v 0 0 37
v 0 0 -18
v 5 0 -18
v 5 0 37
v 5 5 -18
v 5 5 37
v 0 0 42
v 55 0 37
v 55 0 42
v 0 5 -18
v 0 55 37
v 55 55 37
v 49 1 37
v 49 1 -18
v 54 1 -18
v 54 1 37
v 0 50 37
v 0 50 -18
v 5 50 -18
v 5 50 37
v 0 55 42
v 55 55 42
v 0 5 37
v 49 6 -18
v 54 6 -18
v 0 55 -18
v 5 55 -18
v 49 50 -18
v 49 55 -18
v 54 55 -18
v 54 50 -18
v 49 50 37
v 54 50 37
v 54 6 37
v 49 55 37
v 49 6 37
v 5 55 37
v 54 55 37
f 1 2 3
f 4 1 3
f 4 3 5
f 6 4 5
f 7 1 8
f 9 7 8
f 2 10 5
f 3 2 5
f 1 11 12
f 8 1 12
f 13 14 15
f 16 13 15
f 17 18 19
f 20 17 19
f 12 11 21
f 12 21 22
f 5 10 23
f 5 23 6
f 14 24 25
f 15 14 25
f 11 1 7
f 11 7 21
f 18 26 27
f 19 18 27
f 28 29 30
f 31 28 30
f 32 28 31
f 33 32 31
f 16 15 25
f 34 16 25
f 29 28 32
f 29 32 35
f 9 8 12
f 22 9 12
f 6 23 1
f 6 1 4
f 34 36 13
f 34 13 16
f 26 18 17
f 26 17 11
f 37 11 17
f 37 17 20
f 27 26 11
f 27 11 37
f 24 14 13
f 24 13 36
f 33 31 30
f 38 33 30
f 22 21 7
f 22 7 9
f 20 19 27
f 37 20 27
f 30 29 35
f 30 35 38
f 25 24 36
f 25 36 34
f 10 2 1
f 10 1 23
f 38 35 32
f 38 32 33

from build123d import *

# Parameters (mm, degrees)
BOX001_W     = 55
BOX001_H     = 55
BOX001_DEPTH = 5
BOX002_W     = 5
BOX002_H     = 5
BOX002_DEPTH = 55
BOX003_W     = 5
BOX003_H     = 5
BOX003_DEPTH = 55
BOX004_W     = 5
BOX004_H     = 5
BOX004_DEPTH = 55
BOX005_W     = 5
BOX005_H     = 5
BOX005_DEPTH = 55


with BuildPart() as caja001:
    # Box001 → Box001 (new body)
    with BuildSketch(Plane.XY.offset(37)):
        with Locations((27.5, 27.5)):
            Rectangle(BOX001_W, BOX001_H)
    extrude(amount=BOX001_DEPTH)


with BuildPart() as caja002:
    # Box002 → Box002 (new body)
    with BuildSketch(Plane.XY.offset(-18)):
        with Locations((2.5, 2.5)):
            Rectangle(BOX002_W, BOX002_H)
    extrude(amount=BOX002_DEPTH)


with BuildPart() as caja003:
    # Box003 → Box003 (new body)
    with BuildSketch(Plane(origin=(49, 1, -18), x_dir=(1, 0, 0), z_dir=(0, 0, 1))):
        with Locations((2.5, 2.5)):
            Rectangle(BOX003_W, BOX003_H)
    extrude(amount=BOX003_DEPTH)


with BuildPart() as caja004:
    # Box004 → Box004 (new body)
    with BuildSketch(Plane(origin=(49, 50, -18), x_dir=(1, 0, 0), z_dir=(0, 0, 1))):
        with Locations((2.5, 2.5)):
            Rectangle(BOX004_W, BOX004_H)
    extrude(amount=BOX004_DEPTH)


with BuildPart() as caja005:
    # Box005 → Box005 (new body)
    with BuildSketch(Plane(origin=(0, 50, -18), x_dir=(1, 0, 0), z_dir=(0, 0, 1))):
        with Locations((2.5, 2.5)):
            Rectangle(BOX005_W, BOX005_H)
    extrude(amount=BOX005_DEPTH)


solid = Compound([caja001.part, caja002.part, caja003.part, caja004.part, caja005.part])
